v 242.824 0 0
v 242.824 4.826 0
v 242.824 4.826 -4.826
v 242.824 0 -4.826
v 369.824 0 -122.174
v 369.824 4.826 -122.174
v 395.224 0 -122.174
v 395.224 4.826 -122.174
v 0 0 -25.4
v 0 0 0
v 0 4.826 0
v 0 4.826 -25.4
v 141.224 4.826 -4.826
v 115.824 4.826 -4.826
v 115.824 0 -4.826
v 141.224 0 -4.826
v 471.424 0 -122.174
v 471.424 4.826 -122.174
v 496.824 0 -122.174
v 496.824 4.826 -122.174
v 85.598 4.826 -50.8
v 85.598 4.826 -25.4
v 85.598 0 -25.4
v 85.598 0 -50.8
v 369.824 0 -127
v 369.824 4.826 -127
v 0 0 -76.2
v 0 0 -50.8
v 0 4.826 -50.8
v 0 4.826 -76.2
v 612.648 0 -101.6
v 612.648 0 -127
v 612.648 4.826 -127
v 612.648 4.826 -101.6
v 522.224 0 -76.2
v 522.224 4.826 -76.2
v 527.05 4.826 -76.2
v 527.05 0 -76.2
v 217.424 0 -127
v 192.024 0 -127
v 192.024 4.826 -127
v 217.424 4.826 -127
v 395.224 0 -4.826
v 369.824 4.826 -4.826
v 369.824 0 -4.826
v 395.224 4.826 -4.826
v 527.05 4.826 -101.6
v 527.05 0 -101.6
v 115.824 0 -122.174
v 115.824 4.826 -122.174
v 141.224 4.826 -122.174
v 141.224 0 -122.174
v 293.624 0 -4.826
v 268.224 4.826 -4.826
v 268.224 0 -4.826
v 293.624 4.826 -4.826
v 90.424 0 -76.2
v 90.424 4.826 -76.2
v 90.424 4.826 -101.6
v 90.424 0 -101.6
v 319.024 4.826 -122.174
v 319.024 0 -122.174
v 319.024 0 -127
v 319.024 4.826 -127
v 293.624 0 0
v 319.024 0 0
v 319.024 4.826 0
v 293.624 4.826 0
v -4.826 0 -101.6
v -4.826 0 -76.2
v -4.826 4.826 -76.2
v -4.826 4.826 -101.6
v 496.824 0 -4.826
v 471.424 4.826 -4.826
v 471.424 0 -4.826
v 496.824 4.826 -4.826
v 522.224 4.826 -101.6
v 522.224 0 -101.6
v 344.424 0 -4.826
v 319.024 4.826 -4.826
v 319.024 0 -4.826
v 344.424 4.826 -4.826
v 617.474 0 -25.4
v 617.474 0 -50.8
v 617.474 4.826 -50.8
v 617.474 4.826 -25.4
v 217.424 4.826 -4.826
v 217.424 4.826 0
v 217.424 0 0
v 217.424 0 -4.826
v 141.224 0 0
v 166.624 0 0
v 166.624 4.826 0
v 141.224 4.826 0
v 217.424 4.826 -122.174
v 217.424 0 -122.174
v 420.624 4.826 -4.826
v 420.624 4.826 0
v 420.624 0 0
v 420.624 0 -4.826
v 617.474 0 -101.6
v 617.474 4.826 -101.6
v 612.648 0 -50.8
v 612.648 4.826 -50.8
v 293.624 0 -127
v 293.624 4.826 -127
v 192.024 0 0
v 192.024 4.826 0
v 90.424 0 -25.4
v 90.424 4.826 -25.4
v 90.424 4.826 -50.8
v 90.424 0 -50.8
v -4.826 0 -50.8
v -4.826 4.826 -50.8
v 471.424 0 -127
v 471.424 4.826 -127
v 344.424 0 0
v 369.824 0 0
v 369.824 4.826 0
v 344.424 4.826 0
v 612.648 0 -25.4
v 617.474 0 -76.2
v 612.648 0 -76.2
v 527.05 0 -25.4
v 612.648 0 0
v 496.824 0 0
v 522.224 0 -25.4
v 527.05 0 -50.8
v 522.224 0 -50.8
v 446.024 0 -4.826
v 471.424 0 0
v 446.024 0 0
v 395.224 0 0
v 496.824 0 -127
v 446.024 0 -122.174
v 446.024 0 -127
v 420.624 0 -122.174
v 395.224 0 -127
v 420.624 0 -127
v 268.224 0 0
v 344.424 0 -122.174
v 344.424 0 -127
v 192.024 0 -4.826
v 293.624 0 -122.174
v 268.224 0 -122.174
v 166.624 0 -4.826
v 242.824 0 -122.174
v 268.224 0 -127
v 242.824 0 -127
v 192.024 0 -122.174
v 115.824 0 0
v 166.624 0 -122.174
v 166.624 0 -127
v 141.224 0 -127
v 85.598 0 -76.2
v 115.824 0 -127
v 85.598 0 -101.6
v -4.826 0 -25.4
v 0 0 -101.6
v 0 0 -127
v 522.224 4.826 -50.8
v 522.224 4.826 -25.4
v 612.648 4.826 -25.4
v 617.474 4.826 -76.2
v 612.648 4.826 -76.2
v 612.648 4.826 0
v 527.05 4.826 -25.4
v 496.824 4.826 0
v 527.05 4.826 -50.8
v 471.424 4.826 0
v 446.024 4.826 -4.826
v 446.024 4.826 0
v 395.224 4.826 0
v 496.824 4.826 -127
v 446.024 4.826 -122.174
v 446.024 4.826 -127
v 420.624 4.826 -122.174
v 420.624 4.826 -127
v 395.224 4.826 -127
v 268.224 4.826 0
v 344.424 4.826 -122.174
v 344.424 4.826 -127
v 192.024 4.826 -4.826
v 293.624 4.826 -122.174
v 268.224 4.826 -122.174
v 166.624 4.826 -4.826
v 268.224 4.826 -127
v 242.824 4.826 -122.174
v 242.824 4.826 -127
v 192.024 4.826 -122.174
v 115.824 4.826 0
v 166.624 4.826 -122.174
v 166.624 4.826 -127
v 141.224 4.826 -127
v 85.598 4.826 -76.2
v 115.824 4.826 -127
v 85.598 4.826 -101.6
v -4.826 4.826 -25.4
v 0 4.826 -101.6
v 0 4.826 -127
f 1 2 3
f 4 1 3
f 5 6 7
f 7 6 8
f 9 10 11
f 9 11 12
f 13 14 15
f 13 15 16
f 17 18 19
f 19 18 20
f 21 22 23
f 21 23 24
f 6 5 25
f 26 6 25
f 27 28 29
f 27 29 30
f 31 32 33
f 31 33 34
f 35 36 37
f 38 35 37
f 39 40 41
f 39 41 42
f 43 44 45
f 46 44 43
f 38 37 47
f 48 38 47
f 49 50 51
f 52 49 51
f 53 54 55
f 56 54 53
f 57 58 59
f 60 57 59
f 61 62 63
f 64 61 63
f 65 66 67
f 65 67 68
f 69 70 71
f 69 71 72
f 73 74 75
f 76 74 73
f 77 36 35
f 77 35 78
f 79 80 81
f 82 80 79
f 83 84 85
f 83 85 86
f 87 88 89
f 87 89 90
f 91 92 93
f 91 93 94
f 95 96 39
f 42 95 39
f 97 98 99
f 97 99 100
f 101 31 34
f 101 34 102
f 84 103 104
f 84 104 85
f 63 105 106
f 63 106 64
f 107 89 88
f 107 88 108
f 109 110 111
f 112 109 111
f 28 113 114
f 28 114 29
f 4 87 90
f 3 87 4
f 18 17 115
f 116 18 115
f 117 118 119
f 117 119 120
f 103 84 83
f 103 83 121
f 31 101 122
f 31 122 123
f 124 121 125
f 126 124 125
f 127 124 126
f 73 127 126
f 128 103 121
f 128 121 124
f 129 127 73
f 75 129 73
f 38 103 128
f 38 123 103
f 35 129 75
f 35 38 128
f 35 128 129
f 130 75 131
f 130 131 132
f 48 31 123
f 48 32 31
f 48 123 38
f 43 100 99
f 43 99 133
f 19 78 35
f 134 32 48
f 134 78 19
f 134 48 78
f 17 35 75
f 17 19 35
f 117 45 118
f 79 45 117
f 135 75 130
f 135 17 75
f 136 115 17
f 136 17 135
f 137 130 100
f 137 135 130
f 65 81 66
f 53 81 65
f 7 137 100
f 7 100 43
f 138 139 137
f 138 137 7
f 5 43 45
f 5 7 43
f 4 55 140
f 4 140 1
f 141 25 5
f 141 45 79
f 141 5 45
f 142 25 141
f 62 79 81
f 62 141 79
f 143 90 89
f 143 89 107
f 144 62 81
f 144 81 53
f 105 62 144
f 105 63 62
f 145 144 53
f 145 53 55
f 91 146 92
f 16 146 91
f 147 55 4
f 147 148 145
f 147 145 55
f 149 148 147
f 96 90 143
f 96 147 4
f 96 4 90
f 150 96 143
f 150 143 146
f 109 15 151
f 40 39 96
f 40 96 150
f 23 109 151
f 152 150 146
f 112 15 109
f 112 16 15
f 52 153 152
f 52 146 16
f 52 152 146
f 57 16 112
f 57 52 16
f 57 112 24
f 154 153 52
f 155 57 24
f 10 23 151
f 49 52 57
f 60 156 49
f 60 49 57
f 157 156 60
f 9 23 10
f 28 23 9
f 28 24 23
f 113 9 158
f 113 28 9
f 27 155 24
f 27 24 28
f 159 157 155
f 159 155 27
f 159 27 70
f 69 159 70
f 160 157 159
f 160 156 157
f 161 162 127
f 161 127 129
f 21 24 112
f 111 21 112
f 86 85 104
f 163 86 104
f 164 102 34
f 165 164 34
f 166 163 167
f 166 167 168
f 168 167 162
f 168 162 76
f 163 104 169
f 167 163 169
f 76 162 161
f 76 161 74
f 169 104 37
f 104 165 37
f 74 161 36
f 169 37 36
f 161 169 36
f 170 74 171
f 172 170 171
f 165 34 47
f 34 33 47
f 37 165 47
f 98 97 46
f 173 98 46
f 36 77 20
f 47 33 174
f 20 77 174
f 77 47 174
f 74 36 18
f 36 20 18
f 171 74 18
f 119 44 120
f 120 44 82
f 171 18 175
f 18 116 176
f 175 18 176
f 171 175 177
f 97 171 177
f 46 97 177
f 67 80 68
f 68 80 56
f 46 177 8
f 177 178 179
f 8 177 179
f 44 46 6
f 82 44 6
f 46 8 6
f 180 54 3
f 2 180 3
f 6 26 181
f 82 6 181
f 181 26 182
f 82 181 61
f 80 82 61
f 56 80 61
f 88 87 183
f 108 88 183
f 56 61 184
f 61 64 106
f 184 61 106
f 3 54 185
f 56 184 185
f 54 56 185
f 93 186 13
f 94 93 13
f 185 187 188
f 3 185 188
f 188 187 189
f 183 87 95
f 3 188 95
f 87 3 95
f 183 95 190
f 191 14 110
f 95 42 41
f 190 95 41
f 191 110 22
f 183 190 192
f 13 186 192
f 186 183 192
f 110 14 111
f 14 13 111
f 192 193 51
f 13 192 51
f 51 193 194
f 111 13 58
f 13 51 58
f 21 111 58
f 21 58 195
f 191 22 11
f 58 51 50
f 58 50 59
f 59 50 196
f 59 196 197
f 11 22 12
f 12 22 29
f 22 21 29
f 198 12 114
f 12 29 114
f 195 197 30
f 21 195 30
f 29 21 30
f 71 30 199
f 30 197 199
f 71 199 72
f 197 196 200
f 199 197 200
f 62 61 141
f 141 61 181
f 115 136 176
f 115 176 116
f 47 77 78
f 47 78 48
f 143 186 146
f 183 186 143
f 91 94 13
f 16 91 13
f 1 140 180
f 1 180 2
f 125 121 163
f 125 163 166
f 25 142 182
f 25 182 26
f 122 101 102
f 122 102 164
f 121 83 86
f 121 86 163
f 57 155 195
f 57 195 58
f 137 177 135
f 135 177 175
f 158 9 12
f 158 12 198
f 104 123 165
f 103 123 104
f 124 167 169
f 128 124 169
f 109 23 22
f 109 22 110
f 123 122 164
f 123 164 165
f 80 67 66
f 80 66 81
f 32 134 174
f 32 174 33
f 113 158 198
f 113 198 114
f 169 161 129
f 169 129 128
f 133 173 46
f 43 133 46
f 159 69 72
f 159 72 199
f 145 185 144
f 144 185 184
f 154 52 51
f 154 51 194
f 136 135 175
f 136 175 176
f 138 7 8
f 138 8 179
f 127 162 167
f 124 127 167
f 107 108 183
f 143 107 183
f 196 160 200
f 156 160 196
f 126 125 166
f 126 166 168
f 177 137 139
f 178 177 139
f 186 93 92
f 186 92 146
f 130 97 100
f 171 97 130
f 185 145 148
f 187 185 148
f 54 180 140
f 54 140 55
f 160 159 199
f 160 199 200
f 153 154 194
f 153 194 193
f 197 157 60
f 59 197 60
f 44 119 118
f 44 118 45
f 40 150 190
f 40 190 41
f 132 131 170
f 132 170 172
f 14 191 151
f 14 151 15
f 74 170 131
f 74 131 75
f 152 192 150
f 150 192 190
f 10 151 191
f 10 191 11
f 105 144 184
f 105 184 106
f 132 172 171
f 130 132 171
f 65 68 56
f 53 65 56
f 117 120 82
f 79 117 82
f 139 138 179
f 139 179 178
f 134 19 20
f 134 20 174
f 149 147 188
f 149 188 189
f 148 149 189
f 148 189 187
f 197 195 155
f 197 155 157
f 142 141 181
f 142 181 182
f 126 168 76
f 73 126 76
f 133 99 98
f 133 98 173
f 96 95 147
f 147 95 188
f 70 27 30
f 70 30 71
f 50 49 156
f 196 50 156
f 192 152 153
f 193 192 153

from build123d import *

# Parameters (mm, degrees)
BOSS_EXTRUDE1_DEPTH = 4.826
SKETCH2_W           = 4.826
SKETCH2_H           = 25.4
CUT_EXTRUDE1_DEPTH  = 5.826
SKETCH3_W           = 25.4
SKETCH3_H           = 4.826
CUT_EXTRUDE2_DEPTH  = 5.826


with BuildPart() as part:
    # Sketch1 → Boss-Extrude1 (new body)
    with BuildSketch(Plane(origin=(0, 0, 0), x_dir=(1, 0, 0), z_dir=(0, 1, 0))):
        Polygon((0, 101.6), (0, 127), (612.648, 127), (612.648, 101.6), (617.474, 101.6), (617.474, 76.2), (612.648, 76.2), (612.648, 50.8), (617.474, 50.8), (617.474, 25.4), (612.648, 25.4), (612.648, 0), (0, 0), (0, 25.4), (-4.826, 25.4), (-4.826, 50.8), (0, 50.8), (0, 76.2), (-4.826, 76.2), (-4.826, 101.6), align=None)
    extrude(amount=BOSS_EXTRUDE1_DEPTH)

    # Sketch2 → Cut-Extrude1 (cut, through all)
    with BuildSketch(Plane(origin=(0, 4.826, 0), x_dir=(1, 0, 0), z_dir=(0, 1, 0))):
        with Locations((524.637, 88.9)):
            Rectangle(SKETCH2_W, SKETCH2_H)
        with Locations((524.637, 38.1)):
            Rectangle(SKETCH2_W, SKETCH2_H)
        with Locations((88.011, 38.1)):
            Rectangle(SKETCH2_W, SKETCH2_H)
        with Locations((88.011, 88.9)):
            Rectangle(SKETCH2_W, SKETCH2_H)
    extrude(amount=-CUT_EXTRUDE1_DEPTH, mode=Mode.SUBTRACT)

    # Sketch3 → Cut-Extrude2 (cut, through all)
    with BuildSketch(Plane(origin=(0, 4.826, 0), x_dir=(1, 0, 0), z_dir=(0, 1, 0))):
        with Locations((484.124, 2.413)):
            Rectangle(SKETCH3_W, SKETCH3_H)
        with Locations((433.324, 2.413)):
            Rectangle(SKETCH3_W, SKETCH3_H)
        with Locations((382.524, 2.413)):
            Rectangle(SKETCH3_W, SKETCH3_H)
        with Locations((331.724, 2.413)):
            Rectangle(SKETCH3_W, SKETCH3_H)
        with Locations((280.924, 2.413)):
            Rectangle(SKETCH3_W, SKETCH3_H)
        with Locations((230.124, 2.413)):
            Rectangle(SKETCH3_W, SKETCH3_H)
        with Locations((128.524, 2.413)):
            Rectangle(SKETCH3_W, SKETCH3_H)
        with Locations((179.324, 2.413)):
            Rectangle(SKETCH3_W, SKETCH3_H)
        with Locations((128.524, 124.587)):
            Rectangle(SKETCH3_W, SKETCH3_H)
        with Locations((179.324, 124.587)):
            Rectangle(SKETCH3_W, SKETCH3_H)
        with Locations((230.124, 124.587)):
            Rectangle(SKETCH3_W, SKETCH3_H)
        with Locations((280.924, 124.587)):
            Rectangle(SKETCH3_W, SKETCH3_H)
        with Locations((331.724, 124.587)):
            Rectangle(SKETCH3_W, SKETCH3_H)
        with Locations((382.524, 124.587)):
            Rectangle(SKETCH3_W, SKETCH3_H)
        with Locations((433.324, 124.587)):
            Rectangle(SKETCH3_W, SKETCH3_H)
        with Locations((484.124, 124.587)):
            Rectangle(SKETCH3_W, SKETCH3_H)
    extrude(amount=-CUT_EXTRUDE2_DEPTH, mode=Mode.SUBTRACT)


solid = part.part
